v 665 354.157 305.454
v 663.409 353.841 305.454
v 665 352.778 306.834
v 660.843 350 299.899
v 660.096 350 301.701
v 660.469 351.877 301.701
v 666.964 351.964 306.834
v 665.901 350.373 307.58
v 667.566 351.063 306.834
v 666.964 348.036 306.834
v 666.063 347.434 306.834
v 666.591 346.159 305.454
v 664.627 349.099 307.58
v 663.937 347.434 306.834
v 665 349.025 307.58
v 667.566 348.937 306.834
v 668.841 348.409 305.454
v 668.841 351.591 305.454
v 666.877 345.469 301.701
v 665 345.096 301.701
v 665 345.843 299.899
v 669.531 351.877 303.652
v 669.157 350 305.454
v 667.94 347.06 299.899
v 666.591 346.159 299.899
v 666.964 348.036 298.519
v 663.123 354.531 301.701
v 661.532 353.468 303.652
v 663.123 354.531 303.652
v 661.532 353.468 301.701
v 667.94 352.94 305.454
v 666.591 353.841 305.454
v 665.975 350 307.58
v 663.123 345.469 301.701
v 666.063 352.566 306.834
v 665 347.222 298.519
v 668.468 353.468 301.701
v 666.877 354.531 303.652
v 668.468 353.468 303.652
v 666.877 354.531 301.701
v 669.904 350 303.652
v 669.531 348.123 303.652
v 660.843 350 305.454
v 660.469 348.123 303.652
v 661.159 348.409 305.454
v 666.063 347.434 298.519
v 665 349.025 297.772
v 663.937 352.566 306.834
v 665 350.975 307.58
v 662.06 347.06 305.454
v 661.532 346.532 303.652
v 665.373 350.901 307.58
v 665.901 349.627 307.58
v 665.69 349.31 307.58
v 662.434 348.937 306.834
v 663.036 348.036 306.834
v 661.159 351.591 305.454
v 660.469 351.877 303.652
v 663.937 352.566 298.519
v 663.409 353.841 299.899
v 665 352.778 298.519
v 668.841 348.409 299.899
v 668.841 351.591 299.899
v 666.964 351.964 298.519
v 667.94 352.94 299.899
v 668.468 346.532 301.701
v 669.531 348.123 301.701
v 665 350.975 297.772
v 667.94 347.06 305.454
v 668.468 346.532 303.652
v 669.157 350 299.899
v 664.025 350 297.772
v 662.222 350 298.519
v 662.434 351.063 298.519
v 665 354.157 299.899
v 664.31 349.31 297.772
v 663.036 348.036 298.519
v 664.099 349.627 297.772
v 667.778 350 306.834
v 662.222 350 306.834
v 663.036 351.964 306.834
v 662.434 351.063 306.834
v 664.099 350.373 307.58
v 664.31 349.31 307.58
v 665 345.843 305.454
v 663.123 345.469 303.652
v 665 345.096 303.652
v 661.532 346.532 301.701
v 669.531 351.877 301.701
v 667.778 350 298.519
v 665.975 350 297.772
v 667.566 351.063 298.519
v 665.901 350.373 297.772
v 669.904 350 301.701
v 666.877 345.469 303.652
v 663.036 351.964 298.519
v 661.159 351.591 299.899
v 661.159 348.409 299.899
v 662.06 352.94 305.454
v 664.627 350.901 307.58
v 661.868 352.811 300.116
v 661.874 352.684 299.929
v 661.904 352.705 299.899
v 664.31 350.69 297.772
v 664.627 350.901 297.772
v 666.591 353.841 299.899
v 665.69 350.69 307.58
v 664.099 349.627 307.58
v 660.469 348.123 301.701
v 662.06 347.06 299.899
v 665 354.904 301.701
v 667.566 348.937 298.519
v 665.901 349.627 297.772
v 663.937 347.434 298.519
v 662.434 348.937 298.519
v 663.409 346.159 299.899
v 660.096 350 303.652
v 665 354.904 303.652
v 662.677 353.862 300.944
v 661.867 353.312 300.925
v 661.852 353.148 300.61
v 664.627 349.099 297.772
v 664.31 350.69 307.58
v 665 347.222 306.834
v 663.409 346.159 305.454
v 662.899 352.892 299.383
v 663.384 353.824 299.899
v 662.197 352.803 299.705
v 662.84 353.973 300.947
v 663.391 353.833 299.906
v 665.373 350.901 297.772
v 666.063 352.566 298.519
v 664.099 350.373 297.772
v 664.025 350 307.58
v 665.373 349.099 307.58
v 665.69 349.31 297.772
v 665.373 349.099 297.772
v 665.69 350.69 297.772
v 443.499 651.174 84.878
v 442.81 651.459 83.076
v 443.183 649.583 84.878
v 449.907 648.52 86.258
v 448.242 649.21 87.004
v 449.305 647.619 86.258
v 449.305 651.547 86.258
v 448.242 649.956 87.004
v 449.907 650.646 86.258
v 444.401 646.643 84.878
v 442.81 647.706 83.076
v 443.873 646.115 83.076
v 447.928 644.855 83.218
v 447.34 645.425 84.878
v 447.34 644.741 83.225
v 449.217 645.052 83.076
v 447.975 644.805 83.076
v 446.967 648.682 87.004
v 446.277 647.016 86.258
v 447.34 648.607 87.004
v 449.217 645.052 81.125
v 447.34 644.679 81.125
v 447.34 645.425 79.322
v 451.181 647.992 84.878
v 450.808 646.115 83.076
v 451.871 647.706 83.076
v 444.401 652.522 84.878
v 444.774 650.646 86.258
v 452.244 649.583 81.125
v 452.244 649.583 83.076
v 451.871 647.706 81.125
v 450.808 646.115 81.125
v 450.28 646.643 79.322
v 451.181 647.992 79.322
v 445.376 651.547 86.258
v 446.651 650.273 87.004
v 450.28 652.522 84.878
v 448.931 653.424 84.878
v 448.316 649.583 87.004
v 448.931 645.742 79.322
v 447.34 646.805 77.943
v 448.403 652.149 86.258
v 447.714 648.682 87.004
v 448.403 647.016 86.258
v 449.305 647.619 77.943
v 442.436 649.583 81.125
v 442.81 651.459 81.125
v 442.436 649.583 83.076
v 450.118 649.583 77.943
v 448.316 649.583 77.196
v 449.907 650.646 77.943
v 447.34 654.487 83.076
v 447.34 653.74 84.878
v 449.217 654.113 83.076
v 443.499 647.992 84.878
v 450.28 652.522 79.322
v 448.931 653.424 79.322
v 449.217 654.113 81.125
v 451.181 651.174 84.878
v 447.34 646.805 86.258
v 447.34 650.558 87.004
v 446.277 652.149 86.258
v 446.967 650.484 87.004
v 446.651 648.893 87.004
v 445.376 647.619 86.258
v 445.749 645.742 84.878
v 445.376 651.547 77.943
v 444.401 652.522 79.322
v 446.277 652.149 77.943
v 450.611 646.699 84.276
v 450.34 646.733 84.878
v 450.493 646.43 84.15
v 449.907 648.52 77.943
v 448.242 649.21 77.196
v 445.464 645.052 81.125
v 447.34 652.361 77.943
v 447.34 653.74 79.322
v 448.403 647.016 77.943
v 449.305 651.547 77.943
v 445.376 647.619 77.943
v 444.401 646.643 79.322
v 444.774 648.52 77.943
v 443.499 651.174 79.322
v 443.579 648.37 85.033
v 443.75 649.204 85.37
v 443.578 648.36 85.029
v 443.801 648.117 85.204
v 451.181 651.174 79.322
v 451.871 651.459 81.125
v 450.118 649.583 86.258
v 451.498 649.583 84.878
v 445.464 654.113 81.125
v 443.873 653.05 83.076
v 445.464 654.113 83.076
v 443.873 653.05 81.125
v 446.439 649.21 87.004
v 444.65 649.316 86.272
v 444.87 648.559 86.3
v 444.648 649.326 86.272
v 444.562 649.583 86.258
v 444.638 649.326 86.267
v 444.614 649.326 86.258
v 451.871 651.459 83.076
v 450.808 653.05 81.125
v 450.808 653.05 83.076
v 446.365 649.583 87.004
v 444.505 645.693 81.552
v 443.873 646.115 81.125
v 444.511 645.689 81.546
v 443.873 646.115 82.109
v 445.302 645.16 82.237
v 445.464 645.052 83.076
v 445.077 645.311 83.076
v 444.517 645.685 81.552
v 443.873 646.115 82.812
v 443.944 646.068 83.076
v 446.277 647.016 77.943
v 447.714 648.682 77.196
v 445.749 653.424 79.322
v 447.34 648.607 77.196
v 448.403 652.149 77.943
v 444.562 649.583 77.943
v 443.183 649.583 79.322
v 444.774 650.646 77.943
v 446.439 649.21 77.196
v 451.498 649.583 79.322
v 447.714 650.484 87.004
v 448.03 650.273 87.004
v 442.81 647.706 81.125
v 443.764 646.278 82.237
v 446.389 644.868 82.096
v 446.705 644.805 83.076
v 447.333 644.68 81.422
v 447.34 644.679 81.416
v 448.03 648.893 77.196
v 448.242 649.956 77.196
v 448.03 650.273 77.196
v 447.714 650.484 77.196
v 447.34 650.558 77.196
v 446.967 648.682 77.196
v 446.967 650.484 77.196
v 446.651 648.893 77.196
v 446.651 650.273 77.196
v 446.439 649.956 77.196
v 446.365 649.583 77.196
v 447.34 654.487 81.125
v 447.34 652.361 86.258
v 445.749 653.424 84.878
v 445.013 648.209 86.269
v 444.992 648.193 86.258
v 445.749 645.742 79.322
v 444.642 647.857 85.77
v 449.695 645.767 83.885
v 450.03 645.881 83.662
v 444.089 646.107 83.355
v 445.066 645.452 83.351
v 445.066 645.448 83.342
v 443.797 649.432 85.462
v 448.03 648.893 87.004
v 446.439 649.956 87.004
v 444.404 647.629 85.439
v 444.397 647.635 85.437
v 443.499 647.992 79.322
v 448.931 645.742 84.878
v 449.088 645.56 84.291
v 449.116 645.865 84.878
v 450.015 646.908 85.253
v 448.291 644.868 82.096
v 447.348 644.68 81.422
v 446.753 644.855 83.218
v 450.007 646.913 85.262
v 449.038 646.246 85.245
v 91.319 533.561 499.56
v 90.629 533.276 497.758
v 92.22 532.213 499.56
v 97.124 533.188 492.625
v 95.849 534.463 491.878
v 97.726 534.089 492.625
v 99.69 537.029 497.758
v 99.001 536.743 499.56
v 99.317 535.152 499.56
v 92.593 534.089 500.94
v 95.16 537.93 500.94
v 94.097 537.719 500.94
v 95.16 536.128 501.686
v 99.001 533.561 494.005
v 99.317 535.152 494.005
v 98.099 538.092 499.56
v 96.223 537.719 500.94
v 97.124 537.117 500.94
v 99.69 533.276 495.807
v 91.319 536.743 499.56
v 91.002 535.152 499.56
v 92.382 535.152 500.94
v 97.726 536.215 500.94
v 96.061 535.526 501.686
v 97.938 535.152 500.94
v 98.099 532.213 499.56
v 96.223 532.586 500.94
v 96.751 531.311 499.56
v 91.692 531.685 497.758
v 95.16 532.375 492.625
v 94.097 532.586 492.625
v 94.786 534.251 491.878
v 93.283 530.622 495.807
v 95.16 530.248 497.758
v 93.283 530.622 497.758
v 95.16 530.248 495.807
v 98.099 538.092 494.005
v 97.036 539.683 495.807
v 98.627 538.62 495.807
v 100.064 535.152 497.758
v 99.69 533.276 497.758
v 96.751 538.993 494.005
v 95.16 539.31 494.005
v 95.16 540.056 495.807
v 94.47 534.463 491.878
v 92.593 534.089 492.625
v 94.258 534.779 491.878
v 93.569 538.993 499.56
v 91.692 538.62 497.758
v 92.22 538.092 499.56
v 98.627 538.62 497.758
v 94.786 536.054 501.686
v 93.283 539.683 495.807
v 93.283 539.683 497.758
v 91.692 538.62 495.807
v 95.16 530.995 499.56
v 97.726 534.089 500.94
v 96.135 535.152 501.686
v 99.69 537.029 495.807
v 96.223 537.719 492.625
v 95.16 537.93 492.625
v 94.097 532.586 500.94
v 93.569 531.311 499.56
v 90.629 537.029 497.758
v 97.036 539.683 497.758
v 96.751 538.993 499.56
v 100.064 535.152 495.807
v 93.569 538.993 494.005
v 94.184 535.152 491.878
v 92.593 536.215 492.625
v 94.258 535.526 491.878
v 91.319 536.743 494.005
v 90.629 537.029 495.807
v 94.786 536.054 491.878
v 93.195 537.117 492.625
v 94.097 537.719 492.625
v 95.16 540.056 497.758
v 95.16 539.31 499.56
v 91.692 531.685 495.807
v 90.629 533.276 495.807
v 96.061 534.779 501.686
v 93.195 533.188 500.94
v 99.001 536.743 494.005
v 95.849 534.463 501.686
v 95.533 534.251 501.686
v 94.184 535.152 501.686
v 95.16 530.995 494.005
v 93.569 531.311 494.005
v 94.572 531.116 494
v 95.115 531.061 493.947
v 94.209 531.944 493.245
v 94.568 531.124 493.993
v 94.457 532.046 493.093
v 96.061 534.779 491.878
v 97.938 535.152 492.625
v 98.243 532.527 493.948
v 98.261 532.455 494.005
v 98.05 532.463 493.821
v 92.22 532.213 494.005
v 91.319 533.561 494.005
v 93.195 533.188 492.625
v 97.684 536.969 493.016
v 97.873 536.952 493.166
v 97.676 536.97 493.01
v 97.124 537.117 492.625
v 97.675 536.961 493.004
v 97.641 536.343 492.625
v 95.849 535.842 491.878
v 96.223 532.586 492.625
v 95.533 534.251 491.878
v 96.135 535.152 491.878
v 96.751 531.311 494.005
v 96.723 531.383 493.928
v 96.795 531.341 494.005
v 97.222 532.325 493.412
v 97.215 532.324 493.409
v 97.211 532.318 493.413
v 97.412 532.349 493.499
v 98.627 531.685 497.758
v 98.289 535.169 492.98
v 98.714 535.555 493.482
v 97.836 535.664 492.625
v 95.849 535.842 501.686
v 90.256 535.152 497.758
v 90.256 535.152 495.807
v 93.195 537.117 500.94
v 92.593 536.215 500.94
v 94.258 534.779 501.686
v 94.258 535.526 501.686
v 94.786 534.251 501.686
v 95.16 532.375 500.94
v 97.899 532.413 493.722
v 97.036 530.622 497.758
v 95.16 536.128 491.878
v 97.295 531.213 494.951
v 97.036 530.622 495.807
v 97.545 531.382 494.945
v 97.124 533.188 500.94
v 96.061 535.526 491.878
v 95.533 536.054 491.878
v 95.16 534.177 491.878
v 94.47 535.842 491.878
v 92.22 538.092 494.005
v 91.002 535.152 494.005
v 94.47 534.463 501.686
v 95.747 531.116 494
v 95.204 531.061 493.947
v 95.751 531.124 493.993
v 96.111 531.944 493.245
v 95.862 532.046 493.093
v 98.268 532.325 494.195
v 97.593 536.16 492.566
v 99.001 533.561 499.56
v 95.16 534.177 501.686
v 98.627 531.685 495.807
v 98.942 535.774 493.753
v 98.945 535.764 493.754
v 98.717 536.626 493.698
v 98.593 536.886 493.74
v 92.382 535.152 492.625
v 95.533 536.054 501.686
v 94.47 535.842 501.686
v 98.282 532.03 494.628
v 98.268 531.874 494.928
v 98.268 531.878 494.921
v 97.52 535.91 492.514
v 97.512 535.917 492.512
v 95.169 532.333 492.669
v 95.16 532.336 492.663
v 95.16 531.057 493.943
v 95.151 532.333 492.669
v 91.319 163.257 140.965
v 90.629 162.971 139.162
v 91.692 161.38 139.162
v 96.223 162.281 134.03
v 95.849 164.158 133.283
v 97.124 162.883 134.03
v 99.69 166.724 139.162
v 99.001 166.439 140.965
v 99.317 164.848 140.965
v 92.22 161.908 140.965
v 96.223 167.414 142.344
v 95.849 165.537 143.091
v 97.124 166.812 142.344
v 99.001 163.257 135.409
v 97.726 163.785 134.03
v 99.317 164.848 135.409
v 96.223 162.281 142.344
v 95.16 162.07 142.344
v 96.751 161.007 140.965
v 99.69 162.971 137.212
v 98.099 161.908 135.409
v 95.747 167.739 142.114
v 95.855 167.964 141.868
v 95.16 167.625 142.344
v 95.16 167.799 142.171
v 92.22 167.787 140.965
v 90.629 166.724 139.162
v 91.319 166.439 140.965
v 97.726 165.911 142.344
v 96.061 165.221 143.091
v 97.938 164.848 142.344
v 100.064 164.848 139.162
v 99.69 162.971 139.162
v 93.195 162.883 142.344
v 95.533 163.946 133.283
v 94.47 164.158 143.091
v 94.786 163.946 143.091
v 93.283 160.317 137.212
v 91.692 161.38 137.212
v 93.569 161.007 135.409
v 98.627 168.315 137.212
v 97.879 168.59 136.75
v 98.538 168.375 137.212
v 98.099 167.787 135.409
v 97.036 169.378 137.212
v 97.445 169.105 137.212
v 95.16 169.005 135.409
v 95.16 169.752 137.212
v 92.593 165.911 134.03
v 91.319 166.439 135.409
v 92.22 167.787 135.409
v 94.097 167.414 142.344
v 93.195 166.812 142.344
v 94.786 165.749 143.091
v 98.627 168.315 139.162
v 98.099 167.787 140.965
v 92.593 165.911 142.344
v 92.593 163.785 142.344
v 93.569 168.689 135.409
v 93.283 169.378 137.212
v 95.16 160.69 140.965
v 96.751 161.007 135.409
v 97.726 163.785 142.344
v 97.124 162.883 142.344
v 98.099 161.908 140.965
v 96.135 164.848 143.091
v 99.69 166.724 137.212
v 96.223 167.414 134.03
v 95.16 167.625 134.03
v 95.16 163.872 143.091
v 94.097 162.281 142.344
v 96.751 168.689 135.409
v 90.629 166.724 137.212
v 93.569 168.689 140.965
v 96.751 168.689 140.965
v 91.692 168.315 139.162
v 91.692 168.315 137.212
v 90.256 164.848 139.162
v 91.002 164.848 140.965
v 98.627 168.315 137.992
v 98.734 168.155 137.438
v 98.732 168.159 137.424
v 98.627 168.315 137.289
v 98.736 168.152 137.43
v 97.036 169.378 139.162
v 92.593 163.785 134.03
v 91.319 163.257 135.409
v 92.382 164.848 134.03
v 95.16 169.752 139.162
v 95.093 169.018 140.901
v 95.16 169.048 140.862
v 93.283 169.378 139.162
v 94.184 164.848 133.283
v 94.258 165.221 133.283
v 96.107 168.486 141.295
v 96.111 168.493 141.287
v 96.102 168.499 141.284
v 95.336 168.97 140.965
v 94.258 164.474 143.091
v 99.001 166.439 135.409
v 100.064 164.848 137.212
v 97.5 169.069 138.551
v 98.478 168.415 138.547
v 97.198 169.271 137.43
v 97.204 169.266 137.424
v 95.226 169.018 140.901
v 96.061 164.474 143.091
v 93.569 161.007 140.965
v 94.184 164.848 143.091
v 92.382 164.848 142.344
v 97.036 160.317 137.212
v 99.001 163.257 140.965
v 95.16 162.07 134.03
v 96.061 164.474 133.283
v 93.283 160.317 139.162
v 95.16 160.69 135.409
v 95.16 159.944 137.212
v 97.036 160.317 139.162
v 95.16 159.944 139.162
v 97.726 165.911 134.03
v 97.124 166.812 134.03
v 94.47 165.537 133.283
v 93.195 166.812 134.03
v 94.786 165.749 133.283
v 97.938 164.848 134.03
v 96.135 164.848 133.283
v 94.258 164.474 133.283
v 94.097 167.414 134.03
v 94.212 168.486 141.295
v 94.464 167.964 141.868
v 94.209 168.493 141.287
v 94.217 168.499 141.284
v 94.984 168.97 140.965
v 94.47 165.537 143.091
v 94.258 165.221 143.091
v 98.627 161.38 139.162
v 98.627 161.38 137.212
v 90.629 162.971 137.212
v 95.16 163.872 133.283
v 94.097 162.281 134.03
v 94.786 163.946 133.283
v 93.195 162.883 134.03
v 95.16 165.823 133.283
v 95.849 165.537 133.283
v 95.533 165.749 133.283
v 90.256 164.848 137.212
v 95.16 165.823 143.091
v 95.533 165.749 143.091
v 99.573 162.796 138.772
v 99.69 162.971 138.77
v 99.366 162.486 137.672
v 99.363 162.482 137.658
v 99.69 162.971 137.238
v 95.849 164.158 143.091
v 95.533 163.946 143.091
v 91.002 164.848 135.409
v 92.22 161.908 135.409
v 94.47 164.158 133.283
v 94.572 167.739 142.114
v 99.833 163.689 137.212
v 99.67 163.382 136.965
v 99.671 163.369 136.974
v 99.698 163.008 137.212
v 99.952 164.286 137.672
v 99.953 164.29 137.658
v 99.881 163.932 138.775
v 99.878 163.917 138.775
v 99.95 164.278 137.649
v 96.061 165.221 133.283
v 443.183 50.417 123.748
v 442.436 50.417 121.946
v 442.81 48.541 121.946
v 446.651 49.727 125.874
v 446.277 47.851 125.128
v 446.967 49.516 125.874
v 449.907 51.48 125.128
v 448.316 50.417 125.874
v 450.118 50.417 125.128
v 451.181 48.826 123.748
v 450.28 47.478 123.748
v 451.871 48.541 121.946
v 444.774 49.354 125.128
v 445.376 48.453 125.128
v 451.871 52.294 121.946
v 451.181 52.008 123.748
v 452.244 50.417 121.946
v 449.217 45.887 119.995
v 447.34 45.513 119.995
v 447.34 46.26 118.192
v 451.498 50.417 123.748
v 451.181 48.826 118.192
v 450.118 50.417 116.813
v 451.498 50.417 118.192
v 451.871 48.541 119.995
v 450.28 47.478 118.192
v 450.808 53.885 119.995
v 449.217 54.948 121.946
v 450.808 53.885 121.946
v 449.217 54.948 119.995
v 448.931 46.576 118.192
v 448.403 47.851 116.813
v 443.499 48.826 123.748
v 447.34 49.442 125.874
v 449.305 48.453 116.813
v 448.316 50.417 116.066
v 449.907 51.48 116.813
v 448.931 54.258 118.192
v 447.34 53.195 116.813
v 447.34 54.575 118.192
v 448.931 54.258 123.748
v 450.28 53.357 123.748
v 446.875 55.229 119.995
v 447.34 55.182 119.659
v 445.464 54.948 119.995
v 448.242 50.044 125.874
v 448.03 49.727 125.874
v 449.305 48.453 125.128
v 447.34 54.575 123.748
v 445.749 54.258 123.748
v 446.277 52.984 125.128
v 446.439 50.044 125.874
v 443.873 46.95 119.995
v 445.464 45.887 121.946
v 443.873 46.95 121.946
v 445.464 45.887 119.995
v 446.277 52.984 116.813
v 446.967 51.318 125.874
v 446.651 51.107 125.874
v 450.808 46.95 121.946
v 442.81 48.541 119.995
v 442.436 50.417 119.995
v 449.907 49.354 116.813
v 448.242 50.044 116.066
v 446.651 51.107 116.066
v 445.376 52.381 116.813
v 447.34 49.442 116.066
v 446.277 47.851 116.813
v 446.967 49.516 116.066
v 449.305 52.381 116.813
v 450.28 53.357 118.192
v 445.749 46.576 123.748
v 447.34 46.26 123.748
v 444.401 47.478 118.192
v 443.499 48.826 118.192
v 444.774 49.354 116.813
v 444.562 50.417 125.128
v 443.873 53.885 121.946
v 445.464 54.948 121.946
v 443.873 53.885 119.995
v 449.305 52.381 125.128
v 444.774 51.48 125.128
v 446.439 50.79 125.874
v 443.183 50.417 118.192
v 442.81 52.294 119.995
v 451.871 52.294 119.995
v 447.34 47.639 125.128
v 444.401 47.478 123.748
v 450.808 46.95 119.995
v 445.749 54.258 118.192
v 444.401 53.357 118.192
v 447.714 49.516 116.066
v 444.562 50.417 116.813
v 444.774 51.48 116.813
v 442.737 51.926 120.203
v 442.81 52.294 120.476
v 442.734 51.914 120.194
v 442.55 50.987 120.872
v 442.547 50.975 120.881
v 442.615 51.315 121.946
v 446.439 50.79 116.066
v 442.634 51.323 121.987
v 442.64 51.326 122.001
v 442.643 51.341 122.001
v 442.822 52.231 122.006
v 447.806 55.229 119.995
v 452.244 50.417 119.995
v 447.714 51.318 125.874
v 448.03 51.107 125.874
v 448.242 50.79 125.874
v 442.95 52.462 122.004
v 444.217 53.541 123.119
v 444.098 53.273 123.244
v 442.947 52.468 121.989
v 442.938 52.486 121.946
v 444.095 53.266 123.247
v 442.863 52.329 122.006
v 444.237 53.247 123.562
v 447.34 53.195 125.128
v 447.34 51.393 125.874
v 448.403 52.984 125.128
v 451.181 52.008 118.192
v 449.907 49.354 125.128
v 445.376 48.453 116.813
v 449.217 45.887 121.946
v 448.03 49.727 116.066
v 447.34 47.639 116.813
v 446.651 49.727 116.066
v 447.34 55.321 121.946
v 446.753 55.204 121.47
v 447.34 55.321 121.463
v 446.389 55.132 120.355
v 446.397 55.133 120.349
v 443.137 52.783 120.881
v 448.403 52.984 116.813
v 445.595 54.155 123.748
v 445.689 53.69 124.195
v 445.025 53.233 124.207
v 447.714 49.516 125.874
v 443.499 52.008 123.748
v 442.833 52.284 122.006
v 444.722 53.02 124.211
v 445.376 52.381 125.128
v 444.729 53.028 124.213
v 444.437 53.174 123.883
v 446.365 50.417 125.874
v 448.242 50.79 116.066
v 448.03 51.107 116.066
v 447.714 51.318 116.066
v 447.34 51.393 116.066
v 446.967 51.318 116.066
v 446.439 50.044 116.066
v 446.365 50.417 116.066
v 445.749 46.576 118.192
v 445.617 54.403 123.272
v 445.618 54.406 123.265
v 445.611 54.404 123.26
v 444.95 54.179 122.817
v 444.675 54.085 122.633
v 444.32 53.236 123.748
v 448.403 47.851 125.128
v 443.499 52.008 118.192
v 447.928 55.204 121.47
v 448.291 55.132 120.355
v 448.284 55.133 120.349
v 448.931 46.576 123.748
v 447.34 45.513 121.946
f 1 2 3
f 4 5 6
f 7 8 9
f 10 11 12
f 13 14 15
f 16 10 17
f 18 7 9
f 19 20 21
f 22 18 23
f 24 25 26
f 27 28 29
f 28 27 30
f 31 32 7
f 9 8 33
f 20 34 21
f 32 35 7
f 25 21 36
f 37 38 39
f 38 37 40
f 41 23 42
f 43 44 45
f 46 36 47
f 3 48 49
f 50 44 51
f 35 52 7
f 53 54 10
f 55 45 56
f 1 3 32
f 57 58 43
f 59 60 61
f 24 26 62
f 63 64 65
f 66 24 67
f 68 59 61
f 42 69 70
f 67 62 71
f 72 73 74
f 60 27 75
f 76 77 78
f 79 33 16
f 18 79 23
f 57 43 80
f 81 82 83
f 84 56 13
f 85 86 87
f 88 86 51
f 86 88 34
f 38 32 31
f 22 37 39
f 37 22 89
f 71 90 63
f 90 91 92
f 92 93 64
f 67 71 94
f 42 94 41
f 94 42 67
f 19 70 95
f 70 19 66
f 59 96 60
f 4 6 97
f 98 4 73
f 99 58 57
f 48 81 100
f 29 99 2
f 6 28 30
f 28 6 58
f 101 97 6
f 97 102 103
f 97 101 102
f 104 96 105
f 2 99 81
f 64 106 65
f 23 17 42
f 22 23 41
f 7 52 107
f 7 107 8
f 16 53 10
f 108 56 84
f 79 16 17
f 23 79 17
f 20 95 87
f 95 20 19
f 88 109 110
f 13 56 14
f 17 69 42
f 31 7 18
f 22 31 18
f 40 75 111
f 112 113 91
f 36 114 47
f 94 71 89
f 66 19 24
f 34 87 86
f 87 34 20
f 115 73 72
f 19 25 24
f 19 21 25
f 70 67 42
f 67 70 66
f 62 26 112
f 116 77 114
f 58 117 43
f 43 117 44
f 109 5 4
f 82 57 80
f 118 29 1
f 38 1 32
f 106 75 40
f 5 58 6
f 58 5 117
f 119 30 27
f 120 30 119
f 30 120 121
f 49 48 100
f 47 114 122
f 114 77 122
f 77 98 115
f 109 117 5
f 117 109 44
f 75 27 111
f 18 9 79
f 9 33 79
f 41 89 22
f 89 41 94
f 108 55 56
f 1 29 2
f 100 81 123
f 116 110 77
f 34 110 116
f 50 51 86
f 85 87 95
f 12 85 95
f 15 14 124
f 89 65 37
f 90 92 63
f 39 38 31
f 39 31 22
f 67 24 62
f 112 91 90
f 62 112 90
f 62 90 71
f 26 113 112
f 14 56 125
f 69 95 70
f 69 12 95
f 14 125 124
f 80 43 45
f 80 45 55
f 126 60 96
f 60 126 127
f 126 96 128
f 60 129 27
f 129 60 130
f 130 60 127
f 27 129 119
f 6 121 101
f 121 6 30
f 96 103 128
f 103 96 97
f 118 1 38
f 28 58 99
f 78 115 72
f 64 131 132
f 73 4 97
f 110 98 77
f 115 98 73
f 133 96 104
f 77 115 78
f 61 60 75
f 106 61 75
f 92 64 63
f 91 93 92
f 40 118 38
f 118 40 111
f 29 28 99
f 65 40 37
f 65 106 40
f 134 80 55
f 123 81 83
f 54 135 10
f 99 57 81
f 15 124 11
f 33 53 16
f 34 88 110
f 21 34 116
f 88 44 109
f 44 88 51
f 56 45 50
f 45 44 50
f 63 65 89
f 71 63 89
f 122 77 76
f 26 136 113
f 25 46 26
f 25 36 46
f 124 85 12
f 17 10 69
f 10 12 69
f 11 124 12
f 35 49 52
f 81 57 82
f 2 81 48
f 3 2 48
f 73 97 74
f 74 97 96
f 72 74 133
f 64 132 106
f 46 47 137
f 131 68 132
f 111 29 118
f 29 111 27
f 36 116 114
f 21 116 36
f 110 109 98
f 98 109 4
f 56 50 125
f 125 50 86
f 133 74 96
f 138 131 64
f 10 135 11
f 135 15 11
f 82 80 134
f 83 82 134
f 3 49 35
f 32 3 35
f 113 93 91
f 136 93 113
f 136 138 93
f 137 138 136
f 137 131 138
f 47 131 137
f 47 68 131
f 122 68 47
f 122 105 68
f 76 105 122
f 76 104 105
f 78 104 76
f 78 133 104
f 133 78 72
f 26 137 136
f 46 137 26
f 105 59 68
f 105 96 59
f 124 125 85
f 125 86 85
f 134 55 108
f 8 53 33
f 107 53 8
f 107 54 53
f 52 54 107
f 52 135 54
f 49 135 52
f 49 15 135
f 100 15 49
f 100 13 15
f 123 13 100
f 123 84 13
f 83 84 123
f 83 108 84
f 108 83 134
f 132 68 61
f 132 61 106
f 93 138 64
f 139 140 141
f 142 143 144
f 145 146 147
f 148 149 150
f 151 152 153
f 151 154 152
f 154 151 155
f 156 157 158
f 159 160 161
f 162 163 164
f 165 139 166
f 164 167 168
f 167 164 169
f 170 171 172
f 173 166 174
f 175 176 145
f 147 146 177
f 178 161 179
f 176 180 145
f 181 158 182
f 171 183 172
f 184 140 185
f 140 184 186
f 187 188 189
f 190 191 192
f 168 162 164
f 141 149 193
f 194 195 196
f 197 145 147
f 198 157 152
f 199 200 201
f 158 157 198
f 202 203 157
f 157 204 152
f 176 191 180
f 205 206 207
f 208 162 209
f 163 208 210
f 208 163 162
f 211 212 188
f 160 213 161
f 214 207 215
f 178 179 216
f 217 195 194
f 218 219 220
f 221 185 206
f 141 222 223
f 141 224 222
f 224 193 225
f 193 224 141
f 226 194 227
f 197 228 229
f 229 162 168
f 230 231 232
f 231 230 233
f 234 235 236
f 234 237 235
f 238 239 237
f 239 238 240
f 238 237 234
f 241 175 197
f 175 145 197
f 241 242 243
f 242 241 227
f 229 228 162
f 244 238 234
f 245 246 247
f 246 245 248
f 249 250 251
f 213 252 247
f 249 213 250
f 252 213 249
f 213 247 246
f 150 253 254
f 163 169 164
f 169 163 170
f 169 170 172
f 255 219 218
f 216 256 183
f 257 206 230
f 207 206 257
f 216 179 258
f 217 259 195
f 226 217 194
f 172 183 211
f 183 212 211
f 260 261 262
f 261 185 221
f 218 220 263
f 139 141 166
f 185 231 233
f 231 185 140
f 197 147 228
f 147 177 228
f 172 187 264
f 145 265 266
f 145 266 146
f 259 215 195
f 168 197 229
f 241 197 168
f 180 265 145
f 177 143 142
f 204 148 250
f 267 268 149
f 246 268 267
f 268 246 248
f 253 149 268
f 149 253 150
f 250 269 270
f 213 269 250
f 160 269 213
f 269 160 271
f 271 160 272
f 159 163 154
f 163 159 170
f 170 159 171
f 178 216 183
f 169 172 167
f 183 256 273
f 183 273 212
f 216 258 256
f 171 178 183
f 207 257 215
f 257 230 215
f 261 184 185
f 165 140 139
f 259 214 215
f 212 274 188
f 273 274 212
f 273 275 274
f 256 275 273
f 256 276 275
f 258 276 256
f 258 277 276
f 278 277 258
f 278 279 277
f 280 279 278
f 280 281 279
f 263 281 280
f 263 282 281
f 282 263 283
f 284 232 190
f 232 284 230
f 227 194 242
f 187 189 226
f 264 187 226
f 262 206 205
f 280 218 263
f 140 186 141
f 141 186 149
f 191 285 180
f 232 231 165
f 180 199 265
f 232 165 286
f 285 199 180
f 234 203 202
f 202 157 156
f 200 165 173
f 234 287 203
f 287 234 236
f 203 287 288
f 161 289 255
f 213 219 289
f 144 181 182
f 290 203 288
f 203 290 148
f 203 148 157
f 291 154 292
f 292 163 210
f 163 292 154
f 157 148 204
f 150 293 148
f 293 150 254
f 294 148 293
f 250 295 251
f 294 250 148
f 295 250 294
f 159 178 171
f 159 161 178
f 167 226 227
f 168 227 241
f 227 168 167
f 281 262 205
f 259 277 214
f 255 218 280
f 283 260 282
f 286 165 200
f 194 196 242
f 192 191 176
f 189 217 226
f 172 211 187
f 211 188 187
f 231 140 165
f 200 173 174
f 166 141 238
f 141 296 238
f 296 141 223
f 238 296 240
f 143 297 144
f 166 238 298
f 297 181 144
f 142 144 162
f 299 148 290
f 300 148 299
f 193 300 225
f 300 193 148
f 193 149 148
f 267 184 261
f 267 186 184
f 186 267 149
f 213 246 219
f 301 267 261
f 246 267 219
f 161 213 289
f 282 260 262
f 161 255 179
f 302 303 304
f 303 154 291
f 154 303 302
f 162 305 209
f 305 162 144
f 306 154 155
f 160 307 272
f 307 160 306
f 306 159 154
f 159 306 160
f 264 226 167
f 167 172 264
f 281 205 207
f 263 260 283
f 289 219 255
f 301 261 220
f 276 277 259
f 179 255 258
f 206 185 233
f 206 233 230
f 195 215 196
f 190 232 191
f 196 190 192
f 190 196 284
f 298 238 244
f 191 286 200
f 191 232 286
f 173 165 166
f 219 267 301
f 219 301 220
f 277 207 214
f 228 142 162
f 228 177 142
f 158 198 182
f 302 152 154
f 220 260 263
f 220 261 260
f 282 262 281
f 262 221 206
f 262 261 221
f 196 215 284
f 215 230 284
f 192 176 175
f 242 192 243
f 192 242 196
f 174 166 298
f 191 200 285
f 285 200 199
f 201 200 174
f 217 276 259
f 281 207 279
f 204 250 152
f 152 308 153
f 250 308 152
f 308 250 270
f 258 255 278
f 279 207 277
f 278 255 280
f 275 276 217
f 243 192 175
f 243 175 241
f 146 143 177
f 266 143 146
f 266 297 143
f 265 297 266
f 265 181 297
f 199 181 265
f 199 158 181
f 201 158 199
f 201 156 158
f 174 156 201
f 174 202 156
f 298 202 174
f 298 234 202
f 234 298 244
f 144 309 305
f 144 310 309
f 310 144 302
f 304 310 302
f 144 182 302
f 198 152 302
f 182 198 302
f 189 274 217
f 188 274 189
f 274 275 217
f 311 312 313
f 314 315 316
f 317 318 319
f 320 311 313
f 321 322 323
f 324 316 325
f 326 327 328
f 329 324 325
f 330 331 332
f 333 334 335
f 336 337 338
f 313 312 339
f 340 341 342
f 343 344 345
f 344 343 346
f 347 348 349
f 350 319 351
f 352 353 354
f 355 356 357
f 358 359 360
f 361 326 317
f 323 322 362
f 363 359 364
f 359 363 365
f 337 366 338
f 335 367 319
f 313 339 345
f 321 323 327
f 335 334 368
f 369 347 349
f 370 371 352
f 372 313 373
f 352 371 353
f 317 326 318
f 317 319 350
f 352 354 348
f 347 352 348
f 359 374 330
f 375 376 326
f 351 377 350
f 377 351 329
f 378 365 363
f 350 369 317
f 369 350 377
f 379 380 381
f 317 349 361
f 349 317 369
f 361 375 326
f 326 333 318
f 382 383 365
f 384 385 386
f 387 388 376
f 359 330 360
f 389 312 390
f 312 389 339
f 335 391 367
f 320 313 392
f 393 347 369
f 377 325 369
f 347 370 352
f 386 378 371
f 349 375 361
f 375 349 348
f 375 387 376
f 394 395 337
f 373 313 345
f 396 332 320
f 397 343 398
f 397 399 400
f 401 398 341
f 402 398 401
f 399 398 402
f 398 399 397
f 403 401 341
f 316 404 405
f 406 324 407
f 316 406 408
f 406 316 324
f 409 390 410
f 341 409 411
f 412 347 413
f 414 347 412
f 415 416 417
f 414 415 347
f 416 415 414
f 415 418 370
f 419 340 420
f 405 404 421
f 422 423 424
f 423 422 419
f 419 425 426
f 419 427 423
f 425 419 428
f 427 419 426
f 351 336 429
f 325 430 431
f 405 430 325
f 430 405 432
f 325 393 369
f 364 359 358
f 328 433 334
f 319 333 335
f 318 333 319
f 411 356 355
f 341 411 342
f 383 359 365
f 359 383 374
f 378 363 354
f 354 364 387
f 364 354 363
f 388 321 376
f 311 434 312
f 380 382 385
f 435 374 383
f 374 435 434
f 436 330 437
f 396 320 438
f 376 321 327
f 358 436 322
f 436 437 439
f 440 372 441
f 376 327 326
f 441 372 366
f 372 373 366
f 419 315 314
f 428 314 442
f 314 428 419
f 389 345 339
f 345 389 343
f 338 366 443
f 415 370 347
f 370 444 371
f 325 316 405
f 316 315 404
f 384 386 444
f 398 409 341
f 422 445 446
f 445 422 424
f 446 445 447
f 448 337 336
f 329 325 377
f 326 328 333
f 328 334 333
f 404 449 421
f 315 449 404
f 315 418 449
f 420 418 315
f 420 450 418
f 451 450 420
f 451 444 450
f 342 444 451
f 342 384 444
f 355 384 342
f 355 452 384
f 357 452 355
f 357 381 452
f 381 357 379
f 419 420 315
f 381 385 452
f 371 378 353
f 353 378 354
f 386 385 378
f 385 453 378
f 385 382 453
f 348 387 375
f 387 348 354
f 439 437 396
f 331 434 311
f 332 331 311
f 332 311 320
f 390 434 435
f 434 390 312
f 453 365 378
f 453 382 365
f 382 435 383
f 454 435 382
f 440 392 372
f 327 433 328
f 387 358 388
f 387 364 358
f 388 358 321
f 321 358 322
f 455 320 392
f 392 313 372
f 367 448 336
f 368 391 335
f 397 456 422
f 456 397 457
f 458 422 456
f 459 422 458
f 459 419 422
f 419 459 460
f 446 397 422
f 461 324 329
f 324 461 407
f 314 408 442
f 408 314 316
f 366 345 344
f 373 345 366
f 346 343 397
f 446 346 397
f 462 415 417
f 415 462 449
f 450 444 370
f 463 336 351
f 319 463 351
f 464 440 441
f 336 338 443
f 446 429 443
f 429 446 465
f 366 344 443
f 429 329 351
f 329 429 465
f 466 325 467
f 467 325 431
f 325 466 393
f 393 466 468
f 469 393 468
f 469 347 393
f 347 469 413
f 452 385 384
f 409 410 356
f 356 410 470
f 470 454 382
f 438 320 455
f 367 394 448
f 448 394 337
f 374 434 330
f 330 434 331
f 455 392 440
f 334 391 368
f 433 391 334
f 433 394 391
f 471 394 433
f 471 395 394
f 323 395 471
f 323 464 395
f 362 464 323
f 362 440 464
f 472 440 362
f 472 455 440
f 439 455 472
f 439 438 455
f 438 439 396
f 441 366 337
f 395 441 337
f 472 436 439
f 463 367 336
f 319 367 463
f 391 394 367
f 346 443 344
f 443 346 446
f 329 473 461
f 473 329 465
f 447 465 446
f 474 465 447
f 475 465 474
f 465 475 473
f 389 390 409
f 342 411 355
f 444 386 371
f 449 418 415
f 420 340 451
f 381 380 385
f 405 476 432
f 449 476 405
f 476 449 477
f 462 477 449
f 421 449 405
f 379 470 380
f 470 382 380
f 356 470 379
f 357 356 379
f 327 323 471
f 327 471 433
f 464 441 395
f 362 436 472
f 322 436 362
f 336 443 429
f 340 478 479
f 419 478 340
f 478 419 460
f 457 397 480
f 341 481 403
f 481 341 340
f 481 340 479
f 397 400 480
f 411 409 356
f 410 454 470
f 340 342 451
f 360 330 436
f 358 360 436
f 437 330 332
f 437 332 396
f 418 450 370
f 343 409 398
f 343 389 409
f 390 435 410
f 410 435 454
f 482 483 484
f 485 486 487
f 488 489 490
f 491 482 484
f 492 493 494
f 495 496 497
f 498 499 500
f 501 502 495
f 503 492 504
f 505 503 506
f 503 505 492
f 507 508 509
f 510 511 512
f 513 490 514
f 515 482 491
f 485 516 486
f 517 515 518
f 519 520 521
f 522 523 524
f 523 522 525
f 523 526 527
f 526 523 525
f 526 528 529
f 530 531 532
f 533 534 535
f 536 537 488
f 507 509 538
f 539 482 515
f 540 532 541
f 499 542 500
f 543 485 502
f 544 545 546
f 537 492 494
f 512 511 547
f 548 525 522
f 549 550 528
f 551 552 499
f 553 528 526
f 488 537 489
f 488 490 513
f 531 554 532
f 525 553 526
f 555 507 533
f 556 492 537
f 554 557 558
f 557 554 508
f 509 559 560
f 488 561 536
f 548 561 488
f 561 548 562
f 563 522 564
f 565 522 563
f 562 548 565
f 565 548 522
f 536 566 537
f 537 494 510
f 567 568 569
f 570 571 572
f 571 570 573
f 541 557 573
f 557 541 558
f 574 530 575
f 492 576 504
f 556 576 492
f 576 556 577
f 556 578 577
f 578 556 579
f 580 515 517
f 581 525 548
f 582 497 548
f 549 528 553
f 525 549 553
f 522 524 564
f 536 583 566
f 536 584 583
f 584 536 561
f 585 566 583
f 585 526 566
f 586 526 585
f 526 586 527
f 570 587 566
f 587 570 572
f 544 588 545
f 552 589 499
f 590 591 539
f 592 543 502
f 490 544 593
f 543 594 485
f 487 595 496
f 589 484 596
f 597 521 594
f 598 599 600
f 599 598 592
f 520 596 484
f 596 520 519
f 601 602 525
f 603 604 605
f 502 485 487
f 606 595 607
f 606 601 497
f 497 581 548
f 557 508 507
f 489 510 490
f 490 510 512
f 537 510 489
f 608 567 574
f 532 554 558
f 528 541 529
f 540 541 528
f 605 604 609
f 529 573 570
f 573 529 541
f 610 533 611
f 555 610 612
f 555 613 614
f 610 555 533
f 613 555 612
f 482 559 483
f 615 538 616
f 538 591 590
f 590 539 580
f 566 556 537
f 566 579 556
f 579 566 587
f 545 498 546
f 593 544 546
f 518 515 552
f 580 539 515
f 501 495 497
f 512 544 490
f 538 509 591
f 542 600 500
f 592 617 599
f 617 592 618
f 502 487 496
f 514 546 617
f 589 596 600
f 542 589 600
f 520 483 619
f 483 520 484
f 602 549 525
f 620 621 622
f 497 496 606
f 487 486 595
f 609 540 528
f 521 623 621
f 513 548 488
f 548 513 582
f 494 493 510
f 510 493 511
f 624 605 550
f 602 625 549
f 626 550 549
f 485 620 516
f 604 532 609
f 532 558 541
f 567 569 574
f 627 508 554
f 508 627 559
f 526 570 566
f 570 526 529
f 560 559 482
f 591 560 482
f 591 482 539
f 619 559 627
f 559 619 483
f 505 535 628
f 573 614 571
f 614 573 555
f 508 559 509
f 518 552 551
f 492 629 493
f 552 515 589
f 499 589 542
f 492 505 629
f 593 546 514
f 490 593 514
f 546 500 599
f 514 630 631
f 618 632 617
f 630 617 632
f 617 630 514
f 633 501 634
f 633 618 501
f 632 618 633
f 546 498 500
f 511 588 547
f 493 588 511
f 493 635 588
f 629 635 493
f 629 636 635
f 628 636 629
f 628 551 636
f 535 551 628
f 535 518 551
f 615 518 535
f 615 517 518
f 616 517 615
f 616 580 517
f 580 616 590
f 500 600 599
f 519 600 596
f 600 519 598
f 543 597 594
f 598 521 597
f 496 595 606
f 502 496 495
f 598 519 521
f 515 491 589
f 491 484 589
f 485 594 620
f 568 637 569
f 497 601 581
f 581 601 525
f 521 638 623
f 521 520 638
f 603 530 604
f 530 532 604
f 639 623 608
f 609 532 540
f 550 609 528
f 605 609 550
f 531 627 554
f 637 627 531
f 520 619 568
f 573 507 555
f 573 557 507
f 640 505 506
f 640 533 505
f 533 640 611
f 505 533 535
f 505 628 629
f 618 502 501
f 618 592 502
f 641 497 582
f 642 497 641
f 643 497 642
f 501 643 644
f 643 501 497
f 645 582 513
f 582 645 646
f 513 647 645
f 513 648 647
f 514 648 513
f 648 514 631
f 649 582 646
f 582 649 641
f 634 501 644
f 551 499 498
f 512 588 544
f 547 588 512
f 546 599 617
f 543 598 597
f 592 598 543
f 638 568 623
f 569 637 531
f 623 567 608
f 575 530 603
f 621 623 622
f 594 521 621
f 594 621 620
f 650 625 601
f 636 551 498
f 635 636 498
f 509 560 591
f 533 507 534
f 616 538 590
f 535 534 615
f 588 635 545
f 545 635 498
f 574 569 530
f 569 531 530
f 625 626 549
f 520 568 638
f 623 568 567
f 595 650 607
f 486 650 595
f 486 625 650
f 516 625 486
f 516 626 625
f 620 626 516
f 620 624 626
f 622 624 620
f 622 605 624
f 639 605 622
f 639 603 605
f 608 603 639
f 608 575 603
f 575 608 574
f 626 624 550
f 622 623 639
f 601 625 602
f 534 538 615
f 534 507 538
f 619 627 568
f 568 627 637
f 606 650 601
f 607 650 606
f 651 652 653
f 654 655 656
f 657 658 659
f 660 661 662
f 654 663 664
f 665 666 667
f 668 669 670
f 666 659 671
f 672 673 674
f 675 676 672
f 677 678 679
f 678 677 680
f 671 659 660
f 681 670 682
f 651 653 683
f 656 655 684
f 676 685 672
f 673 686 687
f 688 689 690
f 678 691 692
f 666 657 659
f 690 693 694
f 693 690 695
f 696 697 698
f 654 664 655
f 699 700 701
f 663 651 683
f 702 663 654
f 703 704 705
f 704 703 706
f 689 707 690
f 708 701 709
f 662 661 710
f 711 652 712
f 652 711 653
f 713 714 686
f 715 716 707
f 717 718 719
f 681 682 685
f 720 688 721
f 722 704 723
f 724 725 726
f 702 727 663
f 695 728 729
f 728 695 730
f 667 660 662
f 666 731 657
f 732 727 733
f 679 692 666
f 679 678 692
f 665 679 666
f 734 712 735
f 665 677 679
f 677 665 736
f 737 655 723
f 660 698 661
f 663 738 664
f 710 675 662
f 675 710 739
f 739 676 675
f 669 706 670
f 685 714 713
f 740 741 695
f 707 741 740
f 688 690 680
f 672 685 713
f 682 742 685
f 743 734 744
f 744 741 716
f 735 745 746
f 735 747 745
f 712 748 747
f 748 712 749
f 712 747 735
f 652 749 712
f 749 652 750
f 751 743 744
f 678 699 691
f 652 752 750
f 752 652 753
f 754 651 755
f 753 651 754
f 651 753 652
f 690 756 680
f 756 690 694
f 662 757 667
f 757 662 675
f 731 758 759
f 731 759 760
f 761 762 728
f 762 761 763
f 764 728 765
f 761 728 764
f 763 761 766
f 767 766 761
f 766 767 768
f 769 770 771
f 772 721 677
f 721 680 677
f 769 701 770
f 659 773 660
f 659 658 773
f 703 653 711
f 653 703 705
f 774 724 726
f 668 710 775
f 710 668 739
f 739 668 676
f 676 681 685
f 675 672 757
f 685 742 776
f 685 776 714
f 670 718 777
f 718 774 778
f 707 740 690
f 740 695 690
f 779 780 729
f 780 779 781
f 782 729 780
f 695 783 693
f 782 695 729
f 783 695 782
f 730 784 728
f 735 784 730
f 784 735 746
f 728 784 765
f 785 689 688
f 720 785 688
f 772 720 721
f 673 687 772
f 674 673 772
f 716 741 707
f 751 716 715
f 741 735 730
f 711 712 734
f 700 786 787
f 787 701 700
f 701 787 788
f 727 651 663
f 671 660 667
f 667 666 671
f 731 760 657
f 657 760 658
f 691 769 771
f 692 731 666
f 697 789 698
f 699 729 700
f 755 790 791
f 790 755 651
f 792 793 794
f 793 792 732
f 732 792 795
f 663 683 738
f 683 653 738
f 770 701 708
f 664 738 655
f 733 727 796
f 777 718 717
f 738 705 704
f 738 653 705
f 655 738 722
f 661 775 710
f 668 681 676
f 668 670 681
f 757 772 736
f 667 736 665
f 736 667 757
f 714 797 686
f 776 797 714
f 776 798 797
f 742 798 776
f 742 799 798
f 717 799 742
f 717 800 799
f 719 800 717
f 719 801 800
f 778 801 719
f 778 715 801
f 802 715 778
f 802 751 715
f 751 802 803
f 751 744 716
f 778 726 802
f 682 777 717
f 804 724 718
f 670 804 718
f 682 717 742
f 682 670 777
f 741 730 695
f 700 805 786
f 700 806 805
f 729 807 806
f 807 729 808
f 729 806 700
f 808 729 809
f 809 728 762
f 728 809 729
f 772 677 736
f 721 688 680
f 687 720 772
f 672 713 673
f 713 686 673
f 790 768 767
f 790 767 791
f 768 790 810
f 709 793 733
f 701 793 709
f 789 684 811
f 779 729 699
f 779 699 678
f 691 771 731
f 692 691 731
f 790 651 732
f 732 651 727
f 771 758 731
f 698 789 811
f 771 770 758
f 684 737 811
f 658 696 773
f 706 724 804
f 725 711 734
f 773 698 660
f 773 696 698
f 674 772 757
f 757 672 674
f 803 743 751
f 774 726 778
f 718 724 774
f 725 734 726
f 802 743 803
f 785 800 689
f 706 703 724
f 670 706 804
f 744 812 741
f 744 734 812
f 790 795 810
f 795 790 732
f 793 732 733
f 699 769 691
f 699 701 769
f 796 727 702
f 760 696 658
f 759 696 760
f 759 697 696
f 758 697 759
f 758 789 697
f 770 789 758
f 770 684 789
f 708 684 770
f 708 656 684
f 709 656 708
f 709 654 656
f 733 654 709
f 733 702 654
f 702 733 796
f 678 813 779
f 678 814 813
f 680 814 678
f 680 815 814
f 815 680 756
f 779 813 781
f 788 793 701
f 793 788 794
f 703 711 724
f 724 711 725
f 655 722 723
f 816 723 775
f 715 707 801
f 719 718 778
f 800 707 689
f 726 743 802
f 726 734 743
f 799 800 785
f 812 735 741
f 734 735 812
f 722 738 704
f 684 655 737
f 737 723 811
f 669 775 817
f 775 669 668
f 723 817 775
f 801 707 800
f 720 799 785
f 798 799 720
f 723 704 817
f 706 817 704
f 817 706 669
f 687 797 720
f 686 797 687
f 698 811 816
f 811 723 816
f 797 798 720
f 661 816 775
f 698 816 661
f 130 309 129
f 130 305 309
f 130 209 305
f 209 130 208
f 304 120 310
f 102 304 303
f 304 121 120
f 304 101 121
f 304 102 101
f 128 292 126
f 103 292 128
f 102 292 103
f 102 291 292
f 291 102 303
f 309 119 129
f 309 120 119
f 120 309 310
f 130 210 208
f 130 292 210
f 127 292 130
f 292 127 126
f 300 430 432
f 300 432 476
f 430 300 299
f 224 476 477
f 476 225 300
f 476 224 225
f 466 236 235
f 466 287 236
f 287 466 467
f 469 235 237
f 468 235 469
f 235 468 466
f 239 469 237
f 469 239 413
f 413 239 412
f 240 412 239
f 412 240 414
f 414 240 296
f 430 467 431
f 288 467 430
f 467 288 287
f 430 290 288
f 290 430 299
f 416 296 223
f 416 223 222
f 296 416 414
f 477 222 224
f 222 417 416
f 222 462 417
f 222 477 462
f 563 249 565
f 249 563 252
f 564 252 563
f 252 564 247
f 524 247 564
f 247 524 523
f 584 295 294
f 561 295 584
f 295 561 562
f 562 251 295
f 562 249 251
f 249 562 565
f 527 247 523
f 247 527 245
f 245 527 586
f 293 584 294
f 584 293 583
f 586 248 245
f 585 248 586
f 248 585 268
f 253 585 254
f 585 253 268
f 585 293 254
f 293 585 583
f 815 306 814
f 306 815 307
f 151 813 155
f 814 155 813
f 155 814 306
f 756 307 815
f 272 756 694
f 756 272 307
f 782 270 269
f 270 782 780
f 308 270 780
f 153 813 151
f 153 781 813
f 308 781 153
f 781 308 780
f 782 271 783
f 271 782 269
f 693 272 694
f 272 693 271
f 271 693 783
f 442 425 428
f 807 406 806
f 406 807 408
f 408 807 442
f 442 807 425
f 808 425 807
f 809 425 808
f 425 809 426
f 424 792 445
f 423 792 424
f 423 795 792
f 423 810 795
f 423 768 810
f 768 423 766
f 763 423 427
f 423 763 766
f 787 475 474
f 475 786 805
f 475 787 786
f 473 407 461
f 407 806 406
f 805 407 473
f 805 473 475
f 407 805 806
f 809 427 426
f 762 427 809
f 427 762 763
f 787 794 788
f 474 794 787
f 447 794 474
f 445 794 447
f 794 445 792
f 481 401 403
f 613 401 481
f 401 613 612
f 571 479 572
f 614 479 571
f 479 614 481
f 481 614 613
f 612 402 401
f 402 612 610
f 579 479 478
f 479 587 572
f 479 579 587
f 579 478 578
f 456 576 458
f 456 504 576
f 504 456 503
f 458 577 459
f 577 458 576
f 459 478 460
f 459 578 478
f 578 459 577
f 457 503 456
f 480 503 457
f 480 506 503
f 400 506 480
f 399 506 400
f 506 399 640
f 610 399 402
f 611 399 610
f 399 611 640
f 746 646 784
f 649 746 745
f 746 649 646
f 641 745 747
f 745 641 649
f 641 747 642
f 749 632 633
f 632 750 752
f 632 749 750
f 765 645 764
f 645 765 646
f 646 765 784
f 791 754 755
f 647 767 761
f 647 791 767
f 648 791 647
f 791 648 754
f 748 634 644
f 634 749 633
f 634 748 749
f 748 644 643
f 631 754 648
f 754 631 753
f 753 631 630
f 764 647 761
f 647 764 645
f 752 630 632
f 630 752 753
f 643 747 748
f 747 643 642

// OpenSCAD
// Define the node renderer.
//  Parameters:
//  n - the index in the nodes table of the node to render
module renderNode(n) {
    translate(nodeCoordinates[n]) sphere(r = 5, center = true);
};

// Define the edge renderer.
//  Parameters:
//  src - the index in the nodes table of the source node
//  dst - the index in the nodes table of the destination node
module renderEdge(src, dst) {

    // Find the source and destination node coordinates.
    srcNode  = nodeCoordinates[src];
    destNode = nodeCoordinates[dst];

    // Find the vector connecting the source and destination node coordinates.
	diff = [destNode[0] - srcNode[0], destNode[1] - srcNode[1], destNode[2] - srcNode[2]];

    // Find the distance between the source and destination node coordinates.
	length = sqrt(pow(diff[0], 2) + pow(diff[1], 2) + pow(diff[2], 2));

    // Move to the starting point.
	translate(diff / 2 + srcNode) {

        // Rotate around the Z axis.
        rotate([0, 0, atan2(diff[1], diff[0])]) {

            // Rotate around the Y axis.
            rotate([0, atan2(sqrt(pow(diff[0], 2) + pow(diff[1], 2)), diff[2]), 0]) {

                // Draw the edge.
                cylinder(h = length, r = 1.0, center = true);

            }

        }

    }

};

// Define the list of node coordinates.
nodeCoordinates = [
[665.0, 350.0, 302.6764285378201], 
[447.3403532281084, 649.5828026329734, 82.10019289829683], 
[95.1596467718916, 535.1523544721291, 496.78237129837015], 
[95.15964677189154, 164.847645527871, 138.18700610233788], 
[447.34035322810837, 50.417197367026574, 120.97017182918705]
];

// Define the list of node identifiers.
nodeIdentifiers = [
[0, 0], 
[1, 1], 
[2, 2], 
[3, 3], 
[4, 4]
];

// Define the list of edges.
edgeIdentifiers = [
[1, 0, 0], 
[2, 0, 1], 
[3, 1, 0], 
[4, 1, 2], 
[5, 1, 3], 
[6, 1, 4], 
[7, 1, 0], 
[8, 1, 2], 
[9, 1, 3], 
[10, 1, 4], 
[11, 3, 1], 
[12, 3, 3], 
[13, 1, 2], 
[14, 1, 3], 
[15, 2, 1], 
[16, 2, 4], 
[17, 3, 1], 
[18, 3, 2], 
[19, 3, 3], 
[20, 3, 4], 
[21, 4, 1], 
[22, 4, 4]
];

// Render the network nodes.
for (nodeIndex = [0 : len(nodeCoordinates) - 1] ) {
renderNode(nodeIndex);
};

// Render the network edges.
for (edgeIndex = [0 : len(edgeIdentifiers) - 1] ) {
renderEdge(
    lookup(edgeIdentifiers[edgeIndex][1], nodeIdentifiers),
    lookup(edgeIdentifiers[edgeIndex][2], nodeIdentifiers)
);
};
